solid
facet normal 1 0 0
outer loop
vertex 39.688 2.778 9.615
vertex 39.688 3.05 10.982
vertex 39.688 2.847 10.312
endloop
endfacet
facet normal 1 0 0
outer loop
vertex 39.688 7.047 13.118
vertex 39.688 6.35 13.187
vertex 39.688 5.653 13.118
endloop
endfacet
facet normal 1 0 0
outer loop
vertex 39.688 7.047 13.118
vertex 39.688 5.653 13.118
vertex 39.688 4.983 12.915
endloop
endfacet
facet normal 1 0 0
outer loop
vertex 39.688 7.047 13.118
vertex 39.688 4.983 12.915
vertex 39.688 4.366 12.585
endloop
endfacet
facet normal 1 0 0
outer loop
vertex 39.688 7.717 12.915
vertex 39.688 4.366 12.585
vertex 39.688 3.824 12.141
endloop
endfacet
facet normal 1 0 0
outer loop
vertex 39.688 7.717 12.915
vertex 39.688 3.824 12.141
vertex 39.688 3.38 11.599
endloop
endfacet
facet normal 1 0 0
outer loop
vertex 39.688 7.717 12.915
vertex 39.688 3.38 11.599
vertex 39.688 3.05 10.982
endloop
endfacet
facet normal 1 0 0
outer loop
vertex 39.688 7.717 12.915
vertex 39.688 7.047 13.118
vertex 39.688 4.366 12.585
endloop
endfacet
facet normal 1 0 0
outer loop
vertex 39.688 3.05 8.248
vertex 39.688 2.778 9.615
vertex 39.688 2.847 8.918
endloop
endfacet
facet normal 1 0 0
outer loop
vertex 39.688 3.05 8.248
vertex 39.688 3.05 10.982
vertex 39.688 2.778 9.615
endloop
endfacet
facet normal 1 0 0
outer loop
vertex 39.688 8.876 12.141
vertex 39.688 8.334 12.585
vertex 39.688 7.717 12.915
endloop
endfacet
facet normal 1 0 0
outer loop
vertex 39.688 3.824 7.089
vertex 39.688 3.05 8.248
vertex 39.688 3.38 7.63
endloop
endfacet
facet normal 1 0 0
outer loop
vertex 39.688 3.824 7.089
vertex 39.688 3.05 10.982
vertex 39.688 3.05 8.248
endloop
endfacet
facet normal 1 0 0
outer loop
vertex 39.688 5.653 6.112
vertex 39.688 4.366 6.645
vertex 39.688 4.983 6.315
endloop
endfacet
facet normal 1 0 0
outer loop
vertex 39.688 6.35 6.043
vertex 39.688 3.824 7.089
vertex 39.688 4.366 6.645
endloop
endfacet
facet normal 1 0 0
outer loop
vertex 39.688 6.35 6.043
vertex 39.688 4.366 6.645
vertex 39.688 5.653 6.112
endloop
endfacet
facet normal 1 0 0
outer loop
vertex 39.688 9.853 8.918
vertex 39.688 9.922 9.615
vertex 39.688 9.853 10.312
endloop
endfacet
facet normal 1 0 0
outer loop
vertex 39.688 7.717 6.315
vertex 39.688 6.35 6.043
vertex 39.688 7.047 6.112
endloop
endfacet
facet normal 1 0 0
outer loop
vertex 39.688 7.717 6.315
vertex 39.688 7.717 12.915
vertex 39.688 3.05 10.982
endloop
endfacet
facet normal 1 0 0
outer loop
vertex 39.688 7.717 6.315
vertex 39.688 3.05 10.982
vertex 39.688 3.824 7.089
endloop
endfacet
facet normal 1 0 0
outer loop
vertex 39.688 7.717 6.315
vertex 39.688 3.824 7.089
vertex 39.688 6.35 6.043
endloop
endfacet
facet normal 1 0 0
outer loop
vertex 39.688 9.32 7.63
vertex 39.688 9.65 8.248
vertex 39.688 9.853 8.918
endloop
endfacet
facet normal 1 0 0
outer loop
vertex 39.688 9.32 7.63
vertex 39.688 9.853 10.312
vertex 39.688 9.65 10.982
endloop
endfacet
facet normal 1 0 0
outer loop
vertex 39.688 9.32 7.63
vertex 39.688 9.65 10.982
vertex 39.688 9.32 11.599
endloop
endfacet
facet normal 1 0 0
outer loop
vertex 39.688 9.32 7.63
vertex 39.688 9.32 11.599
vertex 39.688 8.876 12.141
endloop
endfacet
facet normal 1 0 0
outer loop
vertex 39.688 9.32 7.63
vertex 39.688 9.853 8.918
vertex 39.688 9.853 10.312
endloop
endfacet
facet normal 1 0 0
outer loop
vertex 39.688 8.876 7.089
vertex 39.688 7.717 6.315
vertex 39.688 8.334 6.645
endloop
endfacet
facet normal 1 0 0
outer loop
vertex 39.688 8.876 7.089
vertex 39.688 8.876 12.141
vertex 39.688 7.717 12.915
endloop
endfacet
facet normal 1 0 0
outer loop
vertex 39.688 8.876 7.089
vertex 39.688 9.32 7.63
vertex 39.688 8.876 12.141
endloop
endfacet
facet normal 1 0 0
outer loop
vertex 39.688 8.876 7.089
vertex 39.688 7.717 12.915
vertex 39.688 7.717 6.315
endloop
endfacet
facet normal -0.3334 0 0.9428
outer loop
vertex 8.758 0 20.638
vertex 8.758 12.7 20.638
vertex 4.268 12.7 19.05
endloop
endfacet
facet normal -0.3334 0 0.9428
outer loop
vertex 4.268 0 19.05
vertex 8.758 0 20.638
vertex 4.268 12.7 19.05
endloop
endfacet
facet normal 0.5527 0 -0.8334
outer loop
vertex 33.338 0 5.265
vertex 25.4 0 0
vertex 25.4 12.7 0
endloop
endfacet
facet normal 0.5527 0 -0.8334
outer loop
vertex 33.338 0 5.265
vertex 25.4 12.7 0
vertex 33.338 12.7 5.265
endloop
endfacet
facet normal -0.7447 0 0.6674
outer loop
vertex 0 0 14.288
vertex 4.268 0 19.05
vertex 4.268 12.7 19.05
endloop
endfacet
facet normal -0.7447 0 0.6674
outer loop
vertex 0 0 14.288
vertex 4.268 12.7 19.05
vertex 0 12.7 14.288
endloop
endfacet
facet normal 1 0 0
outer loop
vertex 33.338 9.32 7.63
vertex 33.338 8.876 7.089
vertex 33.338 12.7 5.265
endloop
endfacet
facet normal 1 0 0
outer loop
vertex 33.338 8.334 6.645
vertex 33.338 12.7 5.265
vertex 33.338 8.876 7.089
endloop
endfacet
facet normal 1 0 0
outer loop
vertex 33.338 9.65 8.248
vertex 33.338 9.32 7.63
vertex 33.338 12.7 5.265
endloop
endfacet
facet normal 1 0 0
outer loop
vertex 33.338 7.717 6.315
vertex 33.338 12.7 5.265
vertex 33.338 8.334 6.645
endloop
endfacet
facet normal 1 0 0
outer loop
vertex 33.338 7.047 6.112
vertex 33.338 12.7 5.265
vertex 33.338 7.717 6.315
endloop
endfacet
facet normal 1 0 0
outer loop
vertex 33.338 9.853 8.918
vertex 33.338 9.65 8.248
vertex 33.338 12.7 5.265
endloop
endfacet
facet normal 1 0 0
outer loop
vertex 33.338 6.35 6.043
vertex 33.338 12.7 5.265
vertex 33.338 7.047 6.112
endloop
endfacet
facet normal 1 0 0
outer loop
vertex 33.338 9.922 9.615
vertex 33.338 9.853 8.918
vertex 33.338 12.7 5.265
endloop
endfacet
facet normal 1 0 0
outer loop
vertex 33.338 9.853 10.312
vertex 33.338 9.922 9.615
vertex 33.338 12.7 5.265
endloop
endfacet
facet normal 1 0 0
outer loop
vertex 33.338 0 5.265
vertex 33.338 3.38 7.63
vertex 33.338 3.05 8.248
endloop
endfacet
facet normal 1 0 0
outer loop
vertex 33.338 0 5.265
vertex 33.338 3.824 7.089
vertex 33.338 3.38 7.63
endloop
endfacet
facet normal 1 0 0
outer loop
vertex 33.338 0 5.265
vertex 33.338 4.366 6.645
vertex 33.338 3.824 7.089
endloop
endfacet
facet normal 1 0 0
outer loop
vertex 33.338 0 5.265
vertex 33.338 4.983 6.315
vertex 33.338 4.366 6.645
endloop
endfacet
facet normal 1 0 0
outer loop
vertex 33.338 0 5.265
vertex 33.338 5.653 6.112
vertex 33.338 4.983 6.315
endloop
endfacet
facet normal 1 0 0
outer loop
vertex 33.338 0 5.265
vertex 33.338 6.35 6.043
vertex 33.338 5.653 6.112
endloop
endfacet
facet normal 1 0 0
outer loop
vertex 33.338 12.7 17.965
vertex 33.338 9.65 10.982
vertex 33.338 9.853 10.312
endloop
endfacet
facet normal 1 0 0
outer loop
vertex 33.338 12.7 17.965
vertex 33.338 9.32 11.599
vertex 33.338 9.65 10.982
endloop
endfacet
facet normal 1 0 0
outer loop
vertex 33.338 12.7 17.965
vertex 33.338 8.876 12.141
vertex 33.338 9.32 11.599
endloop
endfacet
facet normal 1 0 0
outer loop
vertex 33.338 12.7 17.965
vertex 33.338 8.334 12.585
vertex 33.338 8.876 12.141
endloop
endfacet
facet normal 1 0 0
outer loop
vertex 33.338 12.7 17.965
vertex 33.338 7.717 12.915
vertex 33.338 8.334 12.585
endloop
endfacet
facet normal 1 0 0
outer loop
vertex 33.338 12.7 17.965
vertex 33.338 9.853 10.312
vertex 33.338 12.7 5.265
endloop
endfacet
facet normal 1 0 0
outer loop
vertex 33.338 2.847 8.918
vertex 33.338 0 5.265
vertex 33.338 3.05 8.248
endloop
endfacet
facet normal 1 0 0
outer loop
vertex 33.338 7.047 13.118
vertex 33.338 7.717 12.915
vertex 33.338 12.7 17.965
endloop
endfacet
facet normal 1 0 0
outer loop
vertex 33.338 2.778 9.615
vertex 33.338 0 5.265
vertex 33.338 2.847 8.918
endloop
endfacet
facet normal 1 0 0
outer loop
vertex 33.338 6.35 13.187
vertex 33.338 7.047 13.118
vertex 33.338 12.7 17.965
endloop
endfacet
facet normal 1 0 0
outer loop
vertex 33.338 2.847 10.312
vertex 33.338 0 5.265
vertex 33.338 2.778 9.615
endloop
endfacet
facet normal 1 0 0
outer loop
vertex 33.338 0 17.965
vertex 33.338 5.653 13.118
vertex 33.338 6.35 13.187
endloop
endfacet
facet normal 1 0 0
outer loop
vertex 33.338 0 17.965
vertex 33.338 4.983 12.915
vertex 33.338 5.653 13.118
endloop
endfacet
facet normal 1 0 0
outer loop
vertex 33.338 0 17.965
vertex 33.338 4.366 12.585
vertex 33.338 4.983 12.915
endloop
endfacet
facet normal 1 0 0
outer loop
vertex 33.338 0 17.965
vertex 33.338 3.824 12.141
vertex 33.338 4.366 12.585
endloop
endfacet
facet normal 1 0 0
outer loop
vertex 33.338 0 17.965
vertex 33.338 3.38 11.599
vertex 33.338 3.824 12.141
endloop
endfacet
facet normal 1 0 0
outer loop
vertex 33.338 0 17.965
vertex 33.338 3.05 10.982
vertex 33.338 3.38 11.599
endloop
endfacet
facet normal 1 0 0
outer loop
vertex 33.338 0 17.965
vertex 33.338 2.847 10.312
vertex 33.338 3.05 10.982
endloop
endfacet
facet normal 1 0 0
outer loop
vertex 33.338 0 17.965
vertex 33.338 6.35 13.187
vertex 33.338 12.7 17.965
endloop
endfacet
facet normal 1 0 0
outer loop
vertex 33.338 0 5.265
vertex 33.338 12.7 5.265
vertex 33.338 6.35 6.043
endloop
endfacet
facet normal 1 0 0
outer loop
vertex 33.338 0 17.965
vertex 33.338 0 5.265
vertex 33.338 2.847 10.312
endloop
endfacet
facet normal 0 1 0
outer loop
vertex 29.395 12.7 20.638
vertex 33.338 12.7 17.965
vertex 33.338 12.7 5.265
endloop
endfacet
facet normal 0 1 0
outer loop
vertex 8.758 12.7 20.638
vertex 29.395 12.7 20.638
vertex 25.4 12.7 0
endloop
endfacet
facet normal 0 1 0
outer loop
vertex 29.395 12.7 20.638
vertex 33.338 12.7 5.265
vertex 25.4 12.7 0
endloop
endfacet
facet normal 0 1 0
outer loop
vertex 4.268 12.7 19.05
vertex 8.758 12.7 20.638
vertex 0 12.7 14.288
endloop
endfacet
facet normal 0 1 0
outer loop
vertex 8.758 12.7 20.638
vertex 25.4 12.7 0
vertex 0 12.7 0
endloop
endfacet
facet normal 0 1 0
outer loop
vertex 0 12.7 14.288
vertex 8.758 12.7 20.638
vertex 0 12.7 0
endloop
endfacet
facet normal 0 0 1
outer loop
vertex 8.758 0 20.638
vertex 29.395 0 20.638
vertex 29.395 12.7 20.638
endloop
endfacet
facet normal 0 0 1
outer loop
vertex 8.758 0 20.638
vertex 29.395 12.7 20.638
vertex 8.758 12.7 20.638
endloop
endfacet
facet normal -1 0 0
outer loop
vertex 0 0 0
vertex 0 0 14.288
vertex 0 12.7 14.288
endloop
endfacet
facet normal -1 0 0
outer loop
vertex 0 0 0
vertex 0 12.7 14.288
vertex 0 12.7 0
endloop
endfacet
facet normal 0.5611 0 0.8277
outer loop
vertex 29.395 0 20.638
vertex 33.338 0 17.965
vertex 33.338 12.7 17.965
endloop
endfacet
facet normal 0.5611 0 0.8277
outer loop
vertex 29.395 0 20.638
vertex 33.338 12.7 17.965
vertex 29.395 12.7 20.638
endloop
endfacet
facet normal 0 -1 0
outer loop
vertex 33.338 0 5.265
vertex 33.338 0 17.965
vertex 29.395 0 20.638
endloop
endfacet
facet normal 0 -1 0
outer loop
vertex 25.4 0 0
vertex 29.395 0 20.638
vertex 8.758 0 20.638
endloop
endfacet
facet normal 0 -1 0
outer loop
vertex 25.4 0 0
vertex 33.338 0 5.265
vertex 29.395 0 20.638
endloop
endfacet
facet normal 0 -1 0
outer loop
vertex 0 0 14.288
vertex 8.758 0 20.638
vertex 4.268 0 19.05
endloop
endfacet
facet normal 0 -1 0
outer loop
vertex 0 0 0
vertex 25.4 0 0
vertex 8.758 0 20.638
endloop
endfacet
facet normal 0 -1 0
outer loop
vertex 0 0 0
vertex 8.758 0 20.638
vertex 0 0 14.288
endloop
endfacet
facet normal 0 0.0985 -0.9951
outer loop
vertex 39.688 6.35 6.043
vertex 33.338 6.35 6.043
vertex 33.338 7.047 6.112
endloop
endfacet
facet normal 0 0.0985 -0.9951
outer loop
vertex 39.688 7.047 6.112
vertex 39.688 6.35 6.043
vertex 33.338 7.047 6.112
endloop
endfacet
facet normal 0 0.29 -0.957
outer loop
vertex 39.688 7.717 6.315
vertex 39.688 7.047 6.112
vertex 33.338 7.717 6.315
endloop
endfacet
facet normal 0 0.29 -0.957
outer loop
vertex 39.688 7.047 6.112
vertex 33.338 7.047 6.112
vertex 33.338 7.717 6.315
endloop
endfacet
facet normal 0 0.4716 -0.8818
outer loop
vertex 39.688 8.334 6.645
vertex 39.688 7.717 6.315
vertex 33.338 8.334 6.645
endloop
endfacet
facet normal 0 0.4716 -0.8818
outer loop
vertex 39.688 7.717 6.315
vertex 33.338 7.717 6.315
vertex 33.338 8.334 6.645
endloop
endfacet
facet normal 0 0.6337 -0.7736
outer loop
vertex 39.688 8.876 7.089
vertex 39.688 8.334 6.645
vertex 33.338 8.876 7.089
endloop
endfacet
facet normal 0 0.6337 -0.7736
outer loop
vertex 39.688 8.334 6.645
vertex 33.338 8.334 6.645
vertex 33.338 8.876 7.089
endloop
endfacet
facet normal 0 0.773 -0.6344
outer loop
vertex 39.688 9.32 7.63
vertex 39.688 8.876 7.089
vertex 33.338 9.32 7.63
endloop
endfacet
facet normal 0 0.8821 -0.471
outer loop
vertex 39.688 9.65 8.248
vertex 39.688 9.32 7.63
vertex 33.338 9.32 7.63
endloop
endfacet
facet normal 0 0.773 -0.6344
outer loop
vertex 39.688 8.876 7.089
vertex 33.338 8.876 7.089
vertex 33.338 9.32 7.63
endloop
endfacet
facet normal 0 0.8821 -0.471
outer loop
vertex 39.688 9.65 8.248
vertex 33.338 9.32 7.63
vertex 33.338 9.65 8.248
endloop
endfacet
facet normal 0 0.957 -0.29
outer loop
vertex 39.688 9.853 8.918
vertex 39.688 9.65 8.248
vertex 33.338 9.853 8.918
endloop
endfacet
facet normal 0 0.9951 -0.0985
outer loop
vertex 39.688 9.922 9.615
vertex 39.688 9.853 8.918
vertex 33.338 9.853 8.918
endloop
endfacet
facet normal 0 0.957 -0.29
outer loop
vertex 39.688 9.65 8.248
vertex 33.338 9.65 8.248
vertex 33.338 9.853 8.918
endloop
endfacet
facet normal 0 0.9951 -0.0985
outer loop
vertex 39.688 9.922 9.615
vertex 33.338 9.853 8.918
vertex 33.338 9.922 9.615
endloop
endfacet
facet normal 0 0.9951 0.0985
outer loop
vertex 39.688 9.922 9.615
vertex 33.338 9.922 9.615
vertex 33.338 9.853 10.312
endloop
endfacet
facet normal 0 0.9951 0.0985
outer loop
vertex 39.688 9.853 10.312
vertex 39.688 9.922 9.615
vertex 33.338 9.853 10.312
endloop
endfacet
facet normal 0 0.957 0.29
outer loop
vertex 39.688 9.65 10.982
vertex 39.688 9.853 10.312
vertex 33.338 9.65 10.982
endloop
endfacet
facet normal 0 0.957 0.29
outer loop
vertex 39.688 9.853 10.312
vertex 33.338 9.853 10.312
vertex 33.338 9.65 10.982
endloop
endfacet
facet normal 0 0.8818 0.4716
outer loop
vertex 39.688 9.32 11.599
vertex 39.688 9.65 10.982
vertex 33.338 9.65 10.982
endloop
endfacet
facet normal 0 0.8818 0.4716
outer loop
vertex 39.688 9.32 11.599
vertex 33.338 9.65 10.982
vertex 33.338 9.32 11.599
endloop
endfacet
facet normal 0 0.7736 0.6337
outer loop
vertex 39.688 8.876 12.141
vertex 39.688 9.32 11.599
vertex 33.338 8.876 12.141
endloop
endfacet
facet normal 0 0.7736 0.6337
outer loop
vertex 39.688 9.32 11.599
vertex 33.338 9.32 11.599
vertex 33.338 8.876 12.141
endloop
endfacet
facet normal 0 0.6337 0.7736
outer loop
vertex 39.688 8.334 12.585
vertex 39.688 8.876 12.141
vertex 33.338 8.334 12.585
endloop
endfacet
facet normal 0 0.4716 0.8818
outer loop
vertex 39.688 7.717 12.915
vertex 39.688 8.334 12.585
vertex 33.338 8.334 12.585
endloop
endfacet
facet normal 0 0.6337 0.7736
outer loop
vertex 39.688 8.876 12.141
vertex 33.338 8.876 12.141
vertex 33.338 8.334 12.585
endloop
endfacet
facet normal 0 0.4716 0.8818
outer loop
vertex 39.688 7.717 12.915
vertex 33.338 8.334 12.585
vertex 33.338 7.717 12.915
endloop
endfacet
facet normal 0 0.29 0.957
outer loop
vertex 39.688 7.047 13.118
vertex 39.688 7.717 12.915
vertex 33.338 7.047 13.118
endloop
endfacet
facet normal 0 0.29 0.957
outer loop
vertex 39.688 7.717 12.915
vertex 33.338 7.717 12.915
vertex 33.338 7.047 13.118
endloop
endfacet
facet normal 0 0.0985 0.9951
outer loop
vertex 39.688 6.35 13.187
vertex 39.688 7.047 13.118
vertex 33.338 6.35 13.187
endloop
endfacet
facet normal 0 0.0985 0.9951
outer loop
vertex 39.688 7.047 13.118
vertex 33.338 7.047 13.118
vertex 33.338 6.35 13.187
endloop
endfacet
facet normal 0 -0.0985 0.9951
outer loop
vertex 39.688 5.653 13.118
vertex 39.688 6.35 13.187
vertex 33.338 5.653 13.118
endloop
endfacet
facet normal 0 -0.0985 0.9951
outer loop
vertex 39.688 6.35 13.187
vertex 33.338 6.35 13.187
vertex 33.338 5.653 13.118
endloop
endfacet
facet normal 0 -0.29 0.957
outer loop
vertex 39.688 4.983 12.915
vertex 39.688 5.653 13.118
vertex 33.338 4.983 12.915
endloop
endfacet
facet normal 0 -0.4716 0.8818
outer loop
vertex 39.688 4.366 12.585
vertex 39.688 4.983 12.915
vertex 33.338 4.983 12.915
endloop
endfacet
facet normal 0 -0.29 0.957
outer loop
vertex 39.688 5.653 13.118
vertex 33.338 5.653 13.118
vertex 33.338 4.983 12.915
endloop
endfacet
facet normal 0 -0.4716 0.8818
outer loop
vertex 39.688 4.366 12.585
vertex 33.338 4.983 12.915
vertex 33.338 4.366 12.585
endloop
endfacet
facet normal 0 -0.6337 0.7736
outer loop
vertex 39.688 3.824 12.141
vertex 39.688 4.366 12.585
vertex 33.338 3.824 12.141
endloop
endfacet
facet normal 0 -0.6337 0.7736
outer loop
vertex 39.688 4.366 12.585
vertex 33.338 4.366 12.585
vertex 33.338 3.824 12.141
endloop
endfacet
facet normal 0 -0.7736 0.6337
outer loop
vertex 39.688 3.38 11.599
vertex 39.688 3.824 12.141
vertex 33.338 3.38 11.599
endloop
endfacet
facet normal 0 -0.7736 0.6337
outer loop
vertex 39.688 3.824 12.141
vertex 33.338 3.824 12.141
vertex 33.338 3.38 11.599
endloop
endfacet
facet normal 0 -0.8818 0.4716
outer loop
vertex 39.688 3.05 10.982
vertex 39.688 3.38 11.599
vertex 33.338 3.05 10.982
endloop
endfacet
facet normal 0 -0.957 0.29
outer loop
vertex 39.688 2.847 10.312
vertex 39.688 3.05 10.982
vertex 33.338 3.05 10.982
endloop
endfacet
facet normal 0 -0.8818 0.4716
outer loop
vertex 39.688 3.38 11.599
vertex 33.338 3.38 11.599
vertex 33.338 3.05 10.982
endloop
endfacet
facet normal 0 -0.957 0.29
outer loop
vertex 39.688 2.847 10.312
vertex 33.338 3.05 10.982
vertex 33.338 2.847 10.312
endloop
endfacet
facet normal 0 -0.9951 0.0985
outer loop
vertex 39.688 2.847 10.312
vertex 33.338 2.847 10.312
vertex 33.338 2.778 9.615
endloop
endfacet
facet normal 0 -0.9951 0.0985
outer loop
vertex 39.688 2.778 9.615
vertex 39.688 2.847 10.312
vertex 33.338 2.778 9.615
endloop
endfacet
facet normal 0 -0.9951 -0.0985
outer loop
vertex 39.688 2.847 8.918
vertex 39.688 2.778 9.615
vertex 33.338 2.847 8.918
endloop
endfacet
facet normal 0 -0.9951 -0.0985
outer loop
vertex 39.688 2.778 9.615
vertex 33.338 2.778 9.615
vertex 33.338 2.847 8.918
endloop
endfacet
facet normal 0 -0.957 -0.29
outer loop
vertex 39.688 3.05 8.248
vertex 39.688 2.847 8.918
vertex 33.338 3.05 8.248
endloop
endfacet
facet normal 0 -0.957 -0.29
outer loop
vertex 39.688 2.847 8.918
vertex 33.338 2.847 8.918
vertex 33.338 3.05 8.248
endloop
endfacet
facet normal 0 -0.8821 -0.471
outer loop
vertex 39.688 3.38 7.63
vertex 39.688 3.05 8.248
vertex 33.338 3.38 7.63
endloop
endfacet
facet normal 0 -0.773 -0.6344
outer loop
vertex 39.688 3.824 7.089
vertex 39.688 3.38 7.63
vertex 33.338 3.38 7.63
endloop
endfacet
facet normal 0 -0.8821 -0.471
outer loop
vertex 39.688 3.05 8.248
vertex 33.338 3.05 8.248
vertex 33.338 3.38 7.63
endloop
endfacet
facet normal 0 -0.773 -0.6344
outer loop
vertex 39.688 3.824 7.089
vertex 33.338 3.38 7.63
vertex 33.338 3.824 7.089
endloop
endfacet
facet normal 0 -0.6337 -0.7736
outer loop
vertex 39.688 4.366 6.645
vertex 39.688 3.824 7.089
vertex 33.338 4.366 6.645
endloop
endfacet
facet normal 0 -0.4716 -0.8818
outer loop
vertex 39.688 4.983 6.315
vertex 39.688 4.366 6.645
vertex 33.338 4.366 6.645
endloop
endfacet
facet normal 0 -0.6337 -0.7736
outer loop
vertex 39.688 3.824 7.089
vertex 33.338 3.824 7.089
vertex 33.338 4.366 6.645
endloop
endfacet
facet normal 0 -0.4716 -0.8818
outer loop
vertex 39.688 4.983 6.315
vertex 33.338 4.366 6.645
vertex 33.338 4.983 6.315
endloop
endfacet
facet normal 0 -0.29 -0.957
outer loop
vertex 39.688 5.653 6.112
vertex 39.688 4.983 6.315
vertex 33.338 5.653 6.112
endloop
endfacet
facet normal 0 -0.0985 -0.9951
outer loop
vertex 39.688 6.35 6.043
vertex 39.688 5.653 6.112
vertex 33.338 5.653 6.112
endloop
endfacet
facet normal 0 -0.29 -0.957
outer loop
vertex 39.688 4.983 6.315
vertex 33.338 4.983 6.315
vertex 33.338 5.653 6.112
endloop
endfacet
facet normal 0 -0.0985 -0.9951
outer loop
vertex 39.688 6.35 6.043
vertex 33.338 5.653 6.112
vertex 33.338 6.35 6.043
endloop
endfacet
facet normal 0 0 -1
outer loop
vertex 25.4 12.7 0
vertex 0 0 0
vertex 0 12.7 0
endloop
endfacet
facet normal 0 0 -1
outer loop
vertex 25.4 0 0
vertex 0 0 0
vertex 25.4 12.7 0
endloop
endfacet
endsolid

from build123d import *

# Parameters (mm, degrees)
BOSS_EXTRUDE1_DEPTH = 12.7
SKETCH2_R           = 3.571875
BOSS_EXTRUDE2_DEPTH = 6.35


with BuildPart() as part:
    # Sketch1 → Boss-Extrude1 (new body)
    with BuildSketch(Plane(origin=(0, 0, 0), x_dir=(1, 0, 0), z_dir=(0, 1, 0))):
        Polygon((0, 0), (25.4, 0), (33.3375, -5.265141855), (33.3375, -17.965141855), (29.395430976, -20.6375), (8.757930976, -20.6375), (4.267802915, -19.05), (0, -14.2875), align=None)
    extrude(amount=BOSS_EXTRUDE1_DEPTH)

    # Sketch2 → Boss-Extrude2 (add)
    with BuildSketch(Plane(origin=(33.3375, 0, 0), x_dir=(0, 0, -1), z_dir=(1, 0, 0))):
        with Locations((-9.614891855, 6.35)):
            Circle(SKETCH2_R)
    extrude(amount=BOSS_EXTRUDE2_DEPTH)


solid = part.part
